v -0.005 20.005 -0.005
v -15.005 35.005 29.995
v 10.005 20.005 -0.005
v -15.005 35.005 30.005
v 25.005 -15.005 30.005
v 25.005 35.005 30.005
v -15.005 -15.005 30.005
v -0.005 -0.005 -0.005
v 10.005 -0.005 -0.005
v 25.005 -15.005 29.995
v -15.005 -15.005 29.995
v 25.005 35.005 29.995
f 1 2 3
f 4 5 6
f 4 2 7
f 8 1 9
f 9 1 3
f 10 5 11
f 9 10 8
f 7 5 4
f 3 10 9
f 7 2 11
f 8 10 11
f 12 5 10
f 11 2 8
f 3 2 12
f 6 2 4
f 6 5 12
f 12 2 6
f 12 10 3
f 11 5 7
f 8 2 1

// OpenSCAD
module rcube(size=[1,1,1],topSize=[],center=false,r=1){
  module sp(){
    if(r <= 0){
      cube([0.01,0.01,0.01],center=true);
    } else {
      sphere(r=r);
    }
  }
  tS = len(topSize) == 0 ? [size[0],size[1]] 
        : len(topSize) == 1 ? [topSize[0], size[1]] 
        : [topSize[0],topSize[1]];
  
  tx=size[0] - r;
  ty=size[1] - r;
  tz=size[2] - r;
  ttx=(tS[0] - r);
  tty=(tS[1] - r);


  cntr = center ? [-(tx/2+r/2),-(ty/2+r/2), -(tz/2+r/2)] : [0,0,0];

  translate(cntr)
  hull(){

    //bottom
    translate([r,r,r])sp();
    translate([tx,r,r])sp();
    translate([r,ty,r])sp();
    translate([tx,ty,r])sp();
    
    //top
    translate([-((ttx-tx)/2),-((tty-ty)/2),0]){
      translate([r,r,tz])sp();
      translate([ttx,r,tz])sp();
      translate([r,tty,tz])sp();
      translate([ttx,tty,tz])sp();
    }
  }
}

rcube([10,20,30],[40,50],r=0);
